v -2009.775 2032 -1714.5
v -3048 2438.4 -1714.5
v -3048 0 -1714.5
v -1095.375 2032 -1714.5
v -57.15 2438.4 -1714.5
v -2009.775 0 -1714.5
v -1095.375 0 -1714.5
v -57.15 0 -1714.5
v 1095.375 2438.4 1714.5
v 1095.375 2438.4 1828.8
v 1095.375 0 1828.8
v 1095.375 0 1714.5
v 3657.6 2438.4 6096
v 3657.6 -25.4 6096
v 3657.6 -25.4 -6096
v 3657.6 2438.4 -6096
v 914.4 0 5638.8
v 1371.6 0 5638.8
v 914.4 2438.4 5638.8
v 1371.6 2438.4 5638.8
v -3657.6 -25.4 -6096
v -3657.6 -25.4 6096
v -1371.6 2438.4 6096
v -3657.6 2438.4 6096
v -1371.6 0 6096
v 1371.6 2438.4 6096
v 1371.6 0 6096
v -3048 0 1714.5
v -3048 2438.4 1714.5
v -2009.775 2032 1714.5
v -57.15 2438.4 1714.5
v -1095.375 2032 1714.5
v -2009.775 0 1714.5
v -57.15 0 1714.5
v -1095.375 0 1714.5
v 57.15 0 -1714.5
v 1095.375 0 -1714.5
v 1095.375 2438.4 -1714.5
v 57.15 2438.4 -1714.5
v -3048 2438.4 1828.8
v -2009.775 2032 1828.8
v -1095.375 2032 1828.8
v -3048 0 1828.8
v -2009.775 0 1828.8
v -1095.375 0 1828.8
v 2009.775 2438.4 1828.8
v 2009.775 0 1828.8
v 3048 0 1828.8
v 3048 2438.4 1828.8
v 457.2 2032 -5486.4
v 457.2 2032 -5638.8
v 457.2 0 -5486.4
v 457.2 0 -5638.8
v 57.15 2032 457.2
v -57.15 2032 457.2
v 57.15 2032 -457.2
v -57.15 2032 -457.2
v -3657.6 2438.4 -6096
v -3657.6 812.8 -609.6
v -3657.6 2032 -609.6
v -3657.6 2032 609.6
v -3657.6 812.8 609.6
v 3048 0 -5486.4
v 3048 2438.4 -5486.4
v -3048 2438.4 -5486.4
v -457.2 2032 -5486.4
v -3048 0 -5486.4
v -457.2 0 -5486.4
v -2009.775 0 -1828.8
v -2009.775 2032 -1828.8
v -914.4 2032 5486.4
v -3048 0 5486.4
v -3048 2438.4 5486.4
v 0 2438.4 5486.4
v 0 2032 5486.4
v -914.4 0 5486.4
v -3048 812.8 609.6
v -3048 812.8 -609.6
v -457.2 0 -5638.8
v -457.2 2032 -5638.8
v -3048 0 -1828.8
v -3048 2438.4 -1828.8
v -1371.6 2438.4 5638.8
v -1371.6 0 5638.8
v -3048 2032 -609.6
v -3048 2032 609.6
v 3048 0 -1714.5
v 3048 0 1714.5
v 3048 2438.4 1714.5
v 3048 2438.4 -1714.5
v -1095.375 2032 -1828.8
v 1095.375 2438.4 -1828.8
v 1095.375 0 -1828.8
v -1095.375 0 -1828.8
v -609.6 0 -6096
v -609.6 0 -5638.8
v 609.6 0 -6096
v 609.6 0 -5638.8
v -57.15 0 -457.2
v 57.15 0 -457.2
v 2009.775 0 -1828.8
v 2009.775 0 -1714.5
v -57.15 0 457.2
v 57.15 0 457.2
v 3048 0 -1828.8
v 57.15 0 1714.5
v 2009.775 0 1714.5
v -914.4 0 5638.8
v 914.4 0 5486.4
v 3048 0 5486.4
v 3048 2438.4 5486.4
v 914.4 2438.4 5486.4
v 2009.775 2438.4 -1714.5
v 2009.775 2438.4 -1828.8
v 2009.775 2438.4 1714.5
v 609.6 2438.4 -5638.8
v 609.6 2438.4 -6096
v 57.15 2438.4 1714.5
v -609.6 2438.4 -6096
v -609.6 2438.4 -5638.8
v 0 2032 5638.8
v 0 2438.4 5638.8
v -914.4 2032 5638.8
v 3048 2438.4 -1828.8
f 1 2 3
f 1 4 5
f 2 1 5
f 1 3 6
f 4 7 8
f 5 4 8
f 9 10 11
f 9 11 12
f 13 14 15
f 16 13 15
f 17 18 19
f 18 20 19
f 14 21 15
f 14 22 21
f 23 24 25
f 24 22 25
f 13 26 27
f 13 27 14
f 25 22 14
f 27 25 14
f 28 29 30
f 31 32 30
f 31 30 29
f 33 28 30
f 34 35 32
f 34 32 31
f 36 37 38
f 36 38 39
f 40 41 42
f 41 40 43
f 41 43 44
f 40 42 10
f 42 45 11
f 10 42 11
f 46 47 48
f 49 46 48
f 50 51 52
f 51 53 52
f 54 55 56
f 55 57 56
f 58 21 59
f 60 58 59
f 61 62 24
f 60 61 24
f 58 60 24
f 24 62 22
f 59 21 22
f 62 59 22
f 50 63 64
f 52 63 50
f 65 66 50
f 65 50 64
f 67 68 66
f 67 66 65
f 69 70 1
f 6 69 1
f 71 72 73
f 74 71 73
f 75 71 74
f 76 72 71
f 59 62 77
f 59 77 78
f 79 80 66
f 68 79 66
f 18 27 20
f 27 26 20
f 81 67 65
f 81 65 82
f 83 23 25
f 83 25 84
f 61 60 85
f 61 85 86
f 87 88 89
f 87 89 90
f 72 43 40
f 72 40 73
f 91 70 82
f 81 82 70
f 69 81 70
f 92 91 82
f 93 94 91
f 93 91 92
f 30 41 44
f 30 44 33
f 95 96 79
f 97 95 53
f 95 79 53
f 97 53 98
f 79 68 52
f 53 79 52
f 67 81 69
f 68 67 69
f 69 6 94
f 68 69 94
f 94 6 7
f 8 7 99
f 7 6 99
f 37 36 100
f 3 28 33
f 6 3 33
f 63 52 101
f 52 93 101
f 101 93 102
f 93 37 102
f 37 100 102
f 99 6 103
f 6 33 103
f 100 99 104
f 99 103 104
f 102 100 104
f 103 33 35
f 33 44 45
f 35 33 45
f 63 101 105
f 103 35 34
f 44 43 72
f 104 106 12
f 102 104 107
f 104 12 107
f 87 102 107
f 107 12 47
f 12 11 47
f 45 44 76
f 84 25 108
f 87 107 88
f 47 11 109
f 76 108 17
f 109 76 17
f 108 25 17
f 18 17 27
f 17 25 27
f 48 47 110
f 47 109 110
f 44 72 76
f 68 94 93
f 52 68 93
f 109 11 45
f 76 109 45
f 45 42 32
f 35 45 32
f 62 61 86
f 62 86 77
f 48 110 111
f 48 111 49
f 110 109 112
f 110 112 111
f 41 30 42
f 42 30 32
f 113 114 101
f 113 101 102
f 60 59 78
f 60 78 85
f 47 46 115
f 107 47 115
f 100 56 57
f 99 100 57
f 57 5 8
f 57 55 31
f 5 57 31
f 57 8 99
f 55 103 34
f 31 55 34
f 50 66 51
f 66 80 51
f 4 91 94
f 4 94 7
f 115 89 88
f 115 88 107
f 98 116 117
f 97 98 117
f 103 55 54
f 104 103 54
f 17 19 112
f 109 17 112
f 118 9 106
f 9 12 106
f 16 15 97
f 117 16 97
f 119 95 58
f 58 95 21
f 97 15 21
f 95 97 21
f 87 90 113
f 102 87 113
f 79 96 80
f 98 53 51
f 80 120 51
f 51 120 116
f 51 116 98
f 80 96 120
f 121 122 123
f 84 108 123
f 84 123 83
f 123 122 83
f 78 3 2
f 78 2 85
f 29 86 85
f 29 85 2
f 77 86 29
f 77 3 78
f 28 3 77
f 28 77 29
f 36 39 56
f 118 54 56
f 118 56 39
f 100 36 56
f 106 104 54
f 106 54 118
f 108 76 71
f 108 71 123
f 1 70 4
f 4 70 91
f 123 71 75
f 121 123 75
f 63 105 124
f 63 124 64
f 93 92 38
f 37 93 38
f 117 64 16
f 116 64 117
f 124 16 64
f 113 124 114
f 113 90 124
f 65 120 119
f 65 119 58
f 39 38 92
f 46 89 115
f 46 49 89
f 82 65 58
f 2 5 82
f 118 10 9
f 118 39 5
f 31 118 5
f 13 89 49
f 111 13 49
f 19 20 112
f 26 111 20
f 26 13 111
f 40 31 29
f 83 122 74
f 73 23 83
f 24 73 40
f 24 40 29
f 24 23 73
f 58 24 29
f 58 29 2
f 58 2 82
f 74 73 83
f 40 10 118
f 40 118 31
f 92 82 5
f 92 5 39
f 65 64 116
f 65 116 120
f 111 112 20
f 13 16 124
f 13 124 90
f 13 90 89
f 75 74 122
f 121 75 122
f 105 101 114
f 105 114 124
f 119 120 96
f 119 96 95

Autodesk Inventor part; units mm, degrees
ref_plane "YZ Plane" through (0, 0, 0) normal (1, 0, 0) x (0, 1, 0)
ref_plane "XZ Plane" through (0, 0, 0) normal (0, 1, 0) x (-1, 0, 0)
ref_plane "XY Plane" through (0, 0, 0) normal (0, 0, 1) x (1, 0, 0)
sketch "Sketch1" plane through (0, 0, 0) normal (0, 1, 0) x (-1, 0, 0)
  line L0 (3657.6, -6096) -> (3657.6, 6096)
  line L1 (-3657.6, 6096) -> (-3657.6, -6096)
  line L2 (-5120.64, 0) -> (5120.64, 0) projected
  line L3 (0, -23842.3169) -> (0, 22994.4703) projected
  line L4 (-3048, 1714.5) -> (-3048, -1714.5)
  line L5 (3048, -5486.4) -> (3048, -1828.8)
  line L6 (3048, -1714.5) -> (3048, 1714.5)
  line L7 (3048, 1828.8) -> (3048, 5486.4)
  line L8 (-3048, -1828.8) -> (-3048, -5486.4)
  line L9 (-3048, 5486.4) -> (-3048, 1828.8)
  line L10 (-3048, 1714.5) -> (-3048, -1714.5)
  line L11 (-2009.775, -1828.8) -> (-2009.775, -1714.5)
  line L12 (-1095.375, -1828.8) -> (-1095.375, -1714.5)
  line L13 (-3048, -1714.5) -> (-2009.775, -1714.5)
  line L14 (-1095.375, -1714.5) -> (-57.15, -1714.5)
  line L15 (-3048, -1828.8) -> (-2009.775, -1828.8)
  line L16 (2009.775, -1828.8) -> (2009.775, -1714.5)
  line L17 (1095.375, -1828.8) -> (1095.375, -1714.5)
  line L18 (3048, -1714.5) -> (2009.775, -1714.5)
  line L19 (1095.375, -1714.5) -> (57.15, -1714.5)
  line L20 (3048, -1828.8) -> (2009.775, -1828.8)
  line L21 (1095.375, -1828.8) -> (-1095.375, -1828.8)
  line L22 (-2009.775, -1828.8) -> (-3048, -1828.8)
  line L23 (-1095.375, -1828.8) -> (1095.375, -1828.8)
  line L24 (2009.775, -1828.8) -> (3048, -1828.8)
  line L25 (57.15, -1714.5) -> (1095.375, -1714.5)
  line L26 (2009.775, -1714.5) -> (3048, -1714.5)
  line L27 (-2009.775, 1828.8) -> (-2009.775, 1714.5)
  line L28 (-1095.375, 1828.8) -> (-1095.375, 1714.5)
  line L29 (-3048, 1714.5) -> (-2009.775, 1714.5)
  line L30 (-1095.375, 1714.5) -> (-57.15, 1714.5)
  line L31 (-3048, 1828.8) -> (-2009.775, 1828.8)
  line L32 (3048, 1714.5) -> (2009.775, 1714.5)
  line L33 (3048, 1828.8) -> (2009.775, 1828.8)
  line L34 (2009.775, 1828.8) -> (2009.775, 1714.5)
  line L35 (1095.375, 1828.8) -> (1095.375, 1714.5)
  line L36 (1095.375, 1714.5) -> (57.15, 1714.5)
  line L37 (1095.375, 1828.8) -> (-1095.375, 1828.8)
  line L38 (-2009.775, 1828.8) -> (-3048, 1828.8)
  line L39 (-1095.375, 1828.8) -> (1095.375, 1828.8)
  line L40 (2009.775, 1828.8) -> (3048, 1828.8)
  line L41 (57.15, 1714.5) -> (1095.375, 1714.5)
  line L42 (2009.775, 1714.5) -> (3048, 1714.5)
  line L43 (-57.15, -457.2) -> (57.15, -457.2)
  line L44 (57.15, 457.2) -> (-57.15, 457.2)
  line L45 (-457.2, -6096) -> (-457.2, -5486.4)
  line L46 (457.2, -6096) -> (457.2, -5486.4)
  line L47 (-3048, -5486.4) -> (-457.2, -5486.4)
  line L48 (457.2, -5486.4) -> (3048, -5486.4)
  line L49 (-3657.6, -6096) -> (-457.2, -6096)
  line L50 (457.2, -6096) -> (3657.6, -6096)
  line L51 (914.4, 5486.4) -> (914.4, 6096)
  line L52 (-914.4, 6096) -> (-914.4, 5486.4)
  line L53 (3048, 5486.4) -> (914.4, 5486.4)
  line L54 (-914.4, 5486.4) -> (-3048, 5486.4)
  line L55 (3657.6, 6096) -> (914.4, 6096)
  line L56 (-914.4, 6096) -> (-3657.6, 6096)
  line L57 (-57.15, -1714.5) -> (-57.15, -457.2)
  line L58 (-57.15, 457.2) -> (-57.15, 1714.5)
  line L59 (-57.15, 1714.5) -> (-57.15, 457.2)
  line L60 (-57.15, -457.2) -> (-57.15, -1714.5)
  line L61 (57.15, -1714.5) -> (57.15, -457.2)
  line L62 (57.15, 457.2) -> (57.15, 1714.5)
  line L63 (57.15, 1714.5) -> (57.15, 457.2)
  line L64 (57.15, -457.2) -> (57.15, -1714.5)
  line L65 (-3048, 5486.4) -> (-3048, 1828.8)
  line L66 (-3048, 1828.8) -> (-2009.775, 1828.8)
  line L67 (-2009.775, 1828.8) -> (-2009.775, 1714.5)
  line L68 (-2009.775, 1714.5) -> (-3048, 1714.5)
  line L69 (-3048, 1714.5) -> (-3048, -1714.5)
  line L70 (-3048, -1714.5) -> (-2009.775, -1714.5)
  line L71 (-2009.775, -1714.5) -> (-2009.775, -1828.8)
  line L72 (-2009.775, -1828.8) -> (-3048, -1828.8)
  line L73 (-3048, -1828.8) -> (-3048, -5486.4)
  line L74 (-3048, -5486.4) -> (-457.2, -5486.4)
  line L75 (457.2, -5486.4) -> (3048, -5486.4)
  line L76 (3048, -5486.4) -> (3048, -1828.8)
  line L77 (3048, -1828.8) -> (2009.775, -1828.8)
  line L78 (2009.775, -1828.8) -> (2009.775, -1714.5)
  line L79 (2009.775, -1714.5) -> (3048, -1714.5)
  line L80 (3048, 1714.5) -> (3048, -1714.5)
  line L81 (3048, 1714.5) -> (2009.775, 1714.5)
  line L82 (2009.775, 1714.5) -> (2009.775, 1828.8)
  line L83 (2009.775, 1828.8) -> (3048, 1828.8)
  line L84 (3048, 1828.8) -> (3048, 5486.4)
  point P0 (0, 0)
  point P1 (0, 23842.3169)
  point P2 (0, -22994.4703)
  dimension "d2" = 7315.2
  dimension "d10" = 609.6
  dimension "d13" = 1038.225
  dimension "d14" = 914.4
  dimension "d17" = 114.3
  dimension "d18" = 1038.225
  dimension "d19" = 1038.225
  dimension "d20" = 914.4
  dimension "d21" = 914.4
  dimension "d23" = 609.6
  dimension "d24" = 4267.2
  dimension "d25" = 1828.8
  dimension "d26" = 12192
  dimension "d27" = 609.6
  dimension "d28" = 114.3
extrude "Extrusion1" add sketch "Sketch1" along normal blind 2438.4
sketch "Sketch2" plane through (-3657.6, 0, -6096) normal (-1, 0, 0) x (0, 0, 1)
  line L0 (0, 0) -> (12192, 0) projected
  line L1 (5486.4, 2032) -> (6705.6, 2032)
  line L2 (6705.6, 2032) -> (6705.6, 812.8)
  line L3 (6705.6, 812.8) -> (5486.4, 812.8)
  line L4 (5486.4, 812.8) -> (5486.4, 2032)
  line L5 (6096, 2926.08) -> (6096, -487.68) projected
  point P0 (6096, 0)
  dimension "d31" = 1219.2
  dimension "d33" = 1219.2
  dimension "d34" = 812.8
extrude "Extrusion2" cut sketch "Sketch2" against normal up to surface (609.6 mm away)
sketch "Sketch3" plane through (0, 2438.4, 0) normal (0, 1, 0) x (1, 0, 0)
  line L0 (57.15, 1714.5) -> (1095.375, 1714.5) projected
  line L1 (1095.375, 1714.5) -> (1095.375, 1828.8) projected
  line L2 (1095.375, 1828.8) -> (-1095.375, 1828.8) projected
  line L3 (-1095.375, 1828.8) -> (-1095.375, 1714.5) projected
  line L4 (-1095.375, 1714.5) -> (-57.15, 1714.5) projected
  line L5 (-57.15, 1714.5) -> (-57.15, 457.2) projected
  line L6 (-57.15, 457.2) -> (57.15, 457.2) projected
  line L7 (57.15, 457.2) -> (57.15, 1714.5) projected
  line L8 (-57.15, -1714.5) -> (-1095.375, -1714.5) projected
  line L9 (-1095.375, -1714.5) -> (-1095.375, -1828.8) projected
  line L10 (-1095.375, -1828.8) -> (1095.375, -1828.8) projected
  line L11 (1095.375, -1828.8) -> (1095.375, -1714.5) projected
  line L12 (1095.375, -1714.5) -> (57.15, -1714.5) projected
  line L13 (57.15, -1714.5) -> (57.15, -457.2) projected
  line L14 (57.15, -457.2) -> (-57.15, -457.2) projected
  line L15 (-57.15, -457.2) -> (-57.15, -1714.5) projected
  line L16 (3657.6, 6096) -> (457.2, 6096) projected
  line L17 (457.2, 6096) -> (457.2, 5486.4) projected
  line L18 (457.2, 5486.4) -> (3048, 5486.4) projected
  line L19 (3048, 5486.4) -> (3048, 1828.8) projected
  line L20 (3048, 1828.8) -> (2009.775, 1828.8) projected
  line L21 (2009.775, 1828.8) -> (2009.775, 1714.5) projected
  line L22 (2009.775, 1714.5) -> (3048, 1714.5) projected
  line L23 (3048, 1714.5) -> (3048, -1714.5) projected
  line L24 (3048, -1714.5) -> (2009.775, -1714.5) projected
  line L25 (2009.775, -1714.5) -> (2009.775, -1828.8) projected
  line L26 (2009.775, -1828.8) -> (3048, -1828.8) projected
  line L27 (3048, -1828.8) -> (3048, -5486.4) projected
  line L28 (3048, -5486.4) -> (914.4, -5486.4) projected
  line L29 (914.4, -5486.4) -> (914.4, -6096) projected
  line L30 (914.4, -6096) -> (3657.6, -6096) projected
  line L31 (3657.6, -6096) -> (3657.6, 6096) projected
  line L32 (-457.2, 6096) -> (457.2, 6096)
  line L33 (457.2, 6096) -> (457.2, 5486.4)
  line L34 (457.2, 5486.4) -> (-457.2, 5486.4)
  line L35 (-457.2, 5486.4) -> (-457.2, 6096)
  line L36 (-2009.775, 1828.8) -> (-1095.375, 1828.8)
  line L37 (-1095.375, 1828.8) -> (-1095.375, 1714.5)
  line L38 (-1095.375, 1714.5) -> (-2009.775, 1714.5)
  line L39 (-2009.775, 1714.5) -> (-2009.775, 1828.8)
  line L40 (1095.375, 1828.8) -> (2009.775, 1828.8)
  line L41 (2009.775, 1828.8) -> (2009.775, 1714.5)
  line L42 (2009.775, 1714.5) -> (1095.375, 1714.5)
  line L43 (1095.375, 1714.5) -> (1095.375, 1828.8)
  line L44 (-57.15, 457.2) -> (57.15, 457.2)
  line L45 (57.15, 457.2) -> (57.15, -457.2)
  line L46 (57.15, -457.2) -> (-57.15, -457.2)
  line L47 (-57.15, -457.2) -> (-57.15, 457.2)
  line L48 (1095.375, -1714.5) -> (2009.775, -1714.5)
  line L49 (2009.775, -1714.5) -> (2009.775, -1828.8)
  line L50 (2009.775, -1828.8) -> (1095.375, -1828.8)
  line L51 (1095.375, -1828.8) -> (1095.375, -1714.5)
  line L52 (-2009.775, -1714.5) -> (-1095.375, -1714.5)
  line L53 (-1095.375, -1714.5) -> (-1095.375, -1828.8)
  line L54 (-1095.375, -1828.8) -> (-2009.775, -1828.8)
  line L55 (-2009.775, -1828.8) -> (-2009.775, -1714.5)
  line L56 (-914.4, -5486.4) -> (914.4, -5486.4)
  line L57 (914.4, -5486.4) -> (914.4, -6096)
  line L58 (914.4, -6096) -> (-914.4, -6096)
  line L59 (-914.4, -6096) -> (-914.4, -5486.4)
  line L60 (1095.375, 1828.8) -> (2009.775, 1828.8)
  line L61 (2009.775, 1828.8) -> (2009.775, 1714.5)
  line L62 (2009.775, 1714.5) -> (1095.375, 1714.5)
  line L63 (1095.375, 1714.5) -> (1095.375, 1828.8)
  point P0 (0, 0)
extrude "Extrusion3" add sketch "Sketch3" against normal blind 406.4 contours L1 L40 L21 L42 | L45 L14 L47 L6 | L3 L38 L39 L36 | L48 L25 L50 L11 | L9 L54 L55 L52 | L34 L35 L32 L17 | L29 L58 L59 L56
sketch "Sketch5" plane through (0, 0, 0) normal (0, -1, 0) x (1, 0, 0)
  line L0 (3657.6, -6096) -> (457.2, -6096) projected
  line L1 (3657.6, 6096) -> (3657.6, -6096) projected
  line L2 (914.4, 6096) -> (3657.6, 6096) projected
  line L3 (914.4, 5486.4) -> (914.4, 6096) projected
  line L4 (3048, 5486.4) -> (914.4, 5486.4) projected
  line L5 (3048, 1828.8) -> (3048, 5486.4) projected
  line L6 (2009.775, 1828.8) -> (3048, 1828.8) projected
  line L7 (2009.775, 1714.5) -> (2009.775, 1828.8) projected
  line L8 (3048, 1714.5) -> (2009.775, 1714.5) projected
  line L9 (3048, -1714.5) -> (3048, 1714.5) projected
  line L10 (2009.775, -1714.5) -> (3048, -1714.5) projected
  line L11 (2009.775, -1828.8) -> (2009.775, -1714.5) projected
  line L12 (3048, -1828.8) -> (2009.775, -1828.8) projected
  line L13 (3048, -5486.4) -> (3048, -1828.8) projected
  line L14 (457.2, -5486.4) -> (3048, -5486.4) projected
  line L15 (457.2, -6096) -> (457.2, -5486.4) projected
  line L16 (-3657.6, 6096) -> (3657.6, 6096)
  line L17 (3657.6, 6096) -> (3657.6, -6096)
  line L18 (3657.6, -6096) -> (-3657.6, -6096)
  line L19 (-3657.6, -6096) -> (-3657.6, 6096)
  point P0 (0, 0)
extrude "Extrusion5" add sketch "Sketch5" along normal blind 25.4
sketch "Sketch6" plane through (0, 2438.4, 0) normal (0, 1, 0) x (1, 0, 0)
  line L0 (-3048, 5486.4) -> (3048, 5486.4) projected
  line L1 (3048, -5486.4) -> (-3048, -5486.4) projected
  line L2 (457.2, 5486.4) -> (457.2, 6096) projected
  line L3 (-457.2, 6096) -> (-457.2, 5486.4) projected
  line L4 (-914.4, -6096) -> (-914.4, -5486.4) projected
  line L5 (914.4, -6096) -> (-914.4, -6096) projected
  line L6 (914.4, -5486.4) -> (914.4, -6096) projected
  line L7 (3048, -5486.4) -> (914.4, -5486.4) projected
  line L8 (3048, -1828.8) -> (3048, -5486.4) projected
  line L9 (2009.775, -1828.8) -> (3048, -1828.8) projected
  line L10 (2009.775, -1714.5) -> (2009.775, -1828.8) projected
  line L11 (3048, -1714.5) -> (2009.775, -1714.5) projected
  line L12 (3048, 1714.5) -> (3048, -1714.5) projected
  line L13 (2009.775, 1714.5) -> (3048, 1714.5) projected
  line L14 (2009.775, 1828.8) -> (2009.775, 1714.5) projected
  line L15 (3048, 1828.8) -> (2009.775, 1828.8) projected
  line L16 (3048, 5486.4) -> (3048, 1828.8) projected
  line L17 (457.2, 5486.4) -> (3048, 5486.4) projected
  line L18 (457.2, 6096) -> (457.2, 5486.4) projected
  line L19 (-457.2, 6096) -> (457.2, 6096) projected
  line L20 (-457.2, 5486.4) -> (-457.2, 6096) projected
  line L21 (-3048, 5486.4) -> (-457.2, 5486.4) projected
  line L22 (-3048, 1828.8) -> (-3048, 5486.4) projected
  line L23 (-2009.775, 1828.8) -> (-3048, 1828.8) projected
  line L24 (-2009.775, 1714.5) -> (-2009.775, 1828.8) projected
  line L25 (-3048, 1714.5) -> (-2009.775, 1714.5) projected
  line L26 (-3048, -1714.5) -> (-3048, 1714.5) projected
  line L27 (-2009.775, -1714.5) -> (-3048, -1714.5) projected
  line L28 (-2009.775, -1828.8) -> (-2009.775, -1714.5) projected
  line L29 (-3048, -1828.8) -> (-2009.775, -1828.8) projected
  line L30 (-3048, -5486.4) -> (-3048, -1828.8) projected
  line L31 (-914.4, -5486.4) -> (-3048, -5486.4) projected
  line L32 (1095.375, -1714.5) -> (57.15, -1714.5) projected
  line L33 (1095.375, -1828.8) -> (1095.375, -1714.5) projected
  line L34 (-1095.375, -1828.8) -> (1095.375, -1828.8) projected
  line L35 (-1095.375, -1714.5) -> (-1095.375, -1828.8) projected
  line L36 (-57.15, -1714.5) -> (-1095.375, -1714.5) projected
  line L37 (-57.15, -457.2) -> (-57.15, -1714.5) projected
  line L38 (57.15, -457.2) -> (-57.15, -457.2) projected
  line L39 (57.15, -1714.5) -> (57.15, -457.2) projected
  line L40 (-57.15, 457.2) -> (57.15, 457.2) projected
  line L41 (-57.15, 1714.5) -> (-57.15, 457.2) projected
  line L42 (-1095.375, 1714.5) -> (-57.15, 1714.5) projected
  line L43 (-1095.375, 1828.8) -> (-1095.375, 1714.5) projected
  line L44 (1095.375, 1828.8) -> (-1095.375, 1828.8) projected
  line L45 (1095.375, 1714.5) -> (1095.375, 1828.8) projected
  line L46 (57.15, 1714.5) -> (1095.375, 1714.5) projected
  line L47 (57.15, 457.2) -> (57.15, 1714.5) projected
  line L48 (-457.2, 6096) -> (457.2, 6096)
  line L49 (457.2, 6096) -> (457.2, 5638.8)
  line L50 (457.2, 5638.8) -> (-457.2, 5638.8)
  line L51 (-457.2, 5638.8) -> (-457.2, 6096)
  line L52 (-914.4, -6096) -> (914.4, -6096)
  line L53 (914.4, -6096) -> (914.4, -5638.8)
  line L54 (914.4, -5638.8) -> (-914.4, -5638.8)
  line L55 (-914.4, -5638.8) -> (-914.4, -6096)
  point P0 (0, 0)
  dimension "d46" = 152.4
  dimension "d47" = 152.4
extrude "Extrusion6" cut sketch "Sketch6" against normal up to next contours L3 L19 L2 L50 | L54 L6 L5 L4
sketch "Sketch7" plane through (0, 2438.4, 0) normal (0, 1, 0) x (1, 0, 0)
  line L0 (-914.4, -5638.8) -> (914.4, -5638.8) projected
  line L1 (3048, -5486.4) -> (-3048, -5486.4) projected
  line L2 (0, -5638.8) -> (914.4, -5638.8)
  line L3 (914.4, -5638.8) -> (914.4, -5486.4)
  line L4 (914.4, -5486.4) -> (0, -5486.4)
  line L5 (0, -5486.4) -> (0, -5638.8)
  point P0 (0, 0)
extrude "Extrusion7" cut sketch "Sketch7" against normal up to next
sketch "Sketch8" plane through (0, 2438.4, 0) normal (0, 1, 0) x (1, 0, 0)
  line L0 (3657.6, 6096) -> (457.2, 6096) projected
  line L1 (-457.2, 5638.8) -> (-457.2, 6096) projected
  line L2 (-457.2, 6096) -> (-3657.6, 6096) projected
  line L3 (-914.4, -6096) -> (-914.4, -5638.8) projected
  line L4 (-914.4, -5638.8) -> (0, -5638.8) projected
  line L5 (-914.4, -6096) -> (-1371.6, -6096)
  line L6 (-1371.6, -6096) -> (-1371.6, -5638.8)
  line L7 (-1371.6, -5638.8) -> (-914.4, -5638.8)
  line L8 (-914.4, -5638.8) -> (-914.4, -6096)
  line L9 (914.4, -6096) -> (1371.6, -6096)
  line L10 (1371.6, -6096) -> (1371.6, -5638.8)
  line L11 (1371.6, -5638.8) -> (914.4, -5638.8)
  line L12 (914.4, -5638.8) -> (914.4, -6096)
  line L13 (457.2, 5638.8) -> (609.6, 5638.8)
  line L14 (609.6, 5638.8) -> (609.6, 6096)
  line L15 (609.6, 6096) -> (457.2, 6096)
  line L16 (457.2, 6096) -> (457.2, 5638.8)
  line L17 (-457.2, 5638.8) -> (-609.6, 5638.8)
  line L18 (-609.6, 5638.8) -> (-609.6, 6096)
  line L19 (-609.6, 6096) -> (-457.2, 6096)
  line L20 (-457.2, 6096) -> (-457.2, 5638.8)
  point P0 (0, 0)
  dimension "d52" = 457.2
  dimension "d53" = 457.2
  dimension "d54" = 152.4
  dimension "d55" = 152.4
extrude "Extrusion8" cut sketch "Sketch8" against normal up to surface (2438.4 mm away)
sketch "Sketch9" plane through (0, 2438.4, 0) normal (0, 1, 0) x (1, 0, 0)
  line L0 (1095.375, -1714.5) -> (57.15, -1714.5) projected
  line L1 (1095.375, -1828.8) -> (1095.375, -1714.5) projected
  line L2 (-1095.375, -1828.8) -> (1095.375, -1828.8) projected
  line L3 (-1095.375, -1714.5) -> (-1095.375, -1828.8) projected
  line L4 (-57.15, -1714.5) -> (-1095.375, -1714.5) projected
  line L5 (-57.15, -457.2) -> (-57.15, -1714.5) projected
  line L6 (57.15, -457.2) -> (-57.15, -457.2) projected
  line L7 (57.15, -1714.5) -> (57.15, -457.2) projected
  line L8 (-57.15, 457.2) -> (57.15, 457.2) projected
  line L9 (-57.15, 1714.5) -> (-57.15, 457.2) projected
  line L10 (-1095.375, 1714.5) -> (-57.15, 1714.5) projected
  line L11 (-1095.375, 1828.8) -> (-1095.375, 1714.5) projected
  line L12 (1095.375, 1828.8) -> (-1095.375, 1828.8) projected
  line L13 (1095.375, 1714.5) -> (1095.375, 1828.8) projected
  line L14 (57.15, 1714.5) -> (1095.375, 1714.5) projected
  line L15 (57.15, 457.2) -> (57.15, 1714.5) projected
  line L16 (914.4, -5486.4) -> (914.4, -5638.8) projected
  line L17 (3048, -5486.4) -> (914.4, -5486.4) projected
  line L18 (3048, -1828.8) -> (3048, -5486.4) projected
  line L19 (2009.775, -1828.8) -> (3048, -1828.8) projected
  line L20 (2009.775, -1714.5) -> (2009.775, -1828.8) projected
  line L21 (3048, -1714.5) -> (2009.775, -1714.5) projected
  line L22 (3048, 1714.5) -> (3048, -1714.5) projected
  line L23 (2009.775, 1714.5) -> (3048, 1714.5) projected
  line L24 (2009.775, 1828.8) -> (2009.775, 1714.5) projected
  line L25 (3048, 1828.8) -> (2009.775, 1828.8) projected
  line L26 (3048, 5486.4) -> (3048, 1828.8) projected
  line L27 (457.2, 5486.4) -> (3048, 5486.4) projected
  line L28 (457.2, 5638.8) -> (457.2, 5486.4) projected
  line L29 (609.6, 5638.8) -> (457.2, 5638.8) projected
  line L30 (609.6, 6096) -> (609.6, 5638.8) projected
  line L31 (-609.6, 6096) -> (609.6, 6096) projected
  line L32 (-609.6, 5638.8) -> (-609.6, 6096) projected
  line L33 (-457.2, 5638.8) -> (-609.6, 5638.8) projected
  line L34 (-457.2, 5486.4) -> (-457.2, 5638.8) projected
  line L35 (-3048, 5486.4) -> (-457.2, 5486.4) projected
  line L36 (-3048, 1828.8) -> (-3048, 5486.4) projected
  line L37 (-2009.775, 1828.8) -> (-3048, 1828.8) projected
  line L38 (-2009.775, 1714.5) -> (-2009.775, 1828.8) projected
  line L39 (-3048, 1714.5) -> (-2009.775, 1714.5) projected
  line L40 (-3048, -1714.5) -> (-3048, 1714.5) projected
  line L41 (-2009.775, -1714.5) -> (-3048, -1714.5) projected
  line L42 (-2009.775, -1828.8) -> (-2009.775, -1714.5) projected
  line L43 (-3048, -1828.8) -> (-2009.775, -1828.8) projected
  line L44 (-3048, -5486.4) -> (-3048, -1828.8) projected
  line L45 (-914.4, -5486.4) -> (-3048, -5486.4) projected
  line L46 (-914.4, -5638.8) -> (-914.4, -5486.4) projected
  line L47 (-1371.6, -5638.8) -> (-914.4, -5638.8) projected
  line L48 (-1371.6, -6096) -> (-1371.6, -5638.8) projected
  line L49 (1371.6, -6096) -> (-1371.6, -6096) projected
  line L50 (1371.6, -5638.8) -> (1371.6, -6096) projected
  line L51 (914.4, -5638.8) -> (1371.6, -5638.8) projected
  line L52 (1095.375, 1828.8) -> (2009.775, 1828.8)
  line L53 (2009.775, 1828.8) -> (2009.775, 1714.5)
  line L54 (2009.775, 1714.5) -> (1095.375, 1714.5)
  line L55 (1095.375, 1714.5) -> (1095.375, 1828.8)
  line L56 (1095.375, -1714.5) -> (2009.775, -1714.5)
  line L57 (2009.775, -1714.5) -> (2009.775, -1828.8)
  line L58 (2009.775, -1828.8) -> (1095.375, -1828.8)
  line L59 (1095.375, -1828.8) -> (1095.375, -1714.5)
  point P0 (0, 0)
extrude "Extrusion9" cut sketch "Sketch9" against normal up to next contours L56 L20 L58 L1 | L54 L13 L52 L24
sketch "Open Doors" plane through (0, 0, 0) normal (0, 1, 0) x (1, 0, 0)
  line L0 (2009.775, -1714.5) -> (2009.775, -1828.8) projected
  line L1 (3048, -1714.5) -> (2009.775, -1714.5) projected
  line L2 (3048, 1714.5) -> (3048, -1714.5) projected
  line L3 (2009.775, 1714.5) -> (3048, 1714.5) projected
  line L4 (2009.775, 1828.8) -> (2009.775, 1714.5) projected
  line L5 (3048, 1828.8) -> (2009.775, 1828.8) projected
  line L6 (3048, 5486.4) -> (3048, 1828.8) projected
  line L7 (457.2, 5486.4) -> (3048, 5486.4) projected
  line L8 (457.2, 5638.8) -> (457.2, 5486.4) projected
  line L9 (609.6, 5638.8) -> (457.2, 5638.8) projected
  line L10 (609.6, 6096) -> (609.6, 5638.8) projected
  line L11 (-609.6, 6096) -> (609.6, 6096) projected
  line L12 (-609.6, 5638.8) -> (-609.6, 6096) projected
  line L13 (-457.2, 5638.8) -> (-609.6, 5638.8) projected
  line L14 (-457.2, 5486.4) -> (-457.2, 5638.8) projected
  line L15 (-3048, 5486.4) -> (-457.2, 5486.4) projected
  line L16 (-3048, 1828.8) -> (-3048, 5486.4) projected
  line L17 (-2009.775, 1828.8) -> (-3048, 1828.8) projected
  line L18 (-2009.775, 1714.5) -> (-2009.775, 1828.8) projected
  line L19 (-3048, 1714.5) -> (-2009.775, 1714.5) projected
  line L20 (-3048, -1714.5) -> (-3048, 1714.5) projected
  line L21 (-2009.775, -1714.5) -> (-3048, -1714.5) projected
  line L22 (-2009.775, -1828.8) -> (-2009.775, -1714.5) projected
  line L23 (-3048, -1828.8) -> (-2009.775, -1828.8) projected
  line L24 (-3048, -5486.4) -> (-3048, -1828.8) projected
  line L25 (-914.4, -5486.4) -> (-3048, -5486.4) projected
  line L26 (-914.4, -5638.8) -> (-914.4, -5486.4) projected
  line L27 (-1371.6, -5638.8) -> (-914.4, -5638.8) projected
  line L28 (-1371.6, -6096) -> (-1371.6, -5638.8) projected
  line L29 (1371.6, -6096) -> (-1371.6, -6096) projected
  line L30 (1371.6, -5638.8) -> (1371.6, -6096) projected
  line L31 (914.4, -5638.8) -> (1371.6, -5638.8) projected
  line L32 (914.4, -5486.4) -> (914.4, -5638.8) projected
  line L33 (3048, -5486.4) -> (914.4, -5486.4) projected
  line L34 (3048, -1828.8) -> (3048, -5486.4) projected
  line L35 (2009.775, -1828.8) -> (3048, -1828.8) projected
  line L36 (57.15, 1714.5) -> (1095.375, 1714.5) projected
  line L37 (57.15, 457.2) -> (57.15, 1714.5) projected
  line L38 (-57.15, 457.2) -> (57.15, 457.2) projected
  line L39 (-57.15, 1714.5) -> (-57.15, 457.2) projected
  line L40 (-1095.375, 1714.5) -> (-57.15, 1714.5) projected
  line L41 (-1095.375, 1828.8) -> (-1095.375, 1714.5) projected
  line L42 (1095.375, 1828.8) -> (-1095.375, 1828.8) projected
  line L43 (1095.375, 1714.5) -> (1095.375, 1828.8) projected
  line L44 (-1095.375, -1828.8) -> (1095.375, -1828.8) projected
  line L45 (-1095.375, -1714.5) -> (-1095.375, -1828.8) projected
  line L46 (-57.15, -1714.5) -> (-1095.375, -1714.5) projected
  line L47 (-57.15, -457.2) -> (-57.15, -1714.5) projected
  line L48 (57.15, -457.2) -> (-57.15, -457.2) projected
  line L49 (57.15, -1714.5) -> (57.15, -457.2) projected
  line L50 (1095.375, -1714.5) -> (57.15, -1714.5) projected
  line L51 (1095.375, -1828.8) -> (1095.375, -1714.5) projected
  line L52 (457.2, 5638.8) -> (746.3587, 6506.276)
  line L53 (746.3587, 6506.276) -> (637.9242, 6542.4208)
  line L54 (637.9242, 6542.4208) -> (348.7655, 5674.9448)
  line L55 (348.7655, 5674.9448) -> (457.2, 5638.8)
  line L56 (914.4, -5638.8) -> (1560.9784, -6285.3784)
  line L57 (1560.9784, -6285.3784) -> (1480.1561, -6366.2007)
  line L58 (1480.1561, -6366.2007) -> (833.5777, -5719.6223)
  line L59 (833.5777, -5719.6223) -> (914.4, -5638.8)
  line L60 (-914.4, -5638.8) -> (-1560.9784, -6285.3784)
  line L61 (-1560.9784, -6285.3784) -> (-1480.1561, -6366.2007)
  line L62 (-1480.1561, -6366.2007) -> (-833.5777, -5719.6223)
  line L63 (-833.5777, -5719.6223) -> (-914.4, -5638.8)
  point P0 (0, 0)
  dimension "d60" = 914.4
  dimension "d62" = 114.3
  dimension "d63" = 914.4
  dimension "d64" = 114.3
  dimension "d65" = 914.4
  dimension "d66" = 114.3
properties part number "East_Structure"
